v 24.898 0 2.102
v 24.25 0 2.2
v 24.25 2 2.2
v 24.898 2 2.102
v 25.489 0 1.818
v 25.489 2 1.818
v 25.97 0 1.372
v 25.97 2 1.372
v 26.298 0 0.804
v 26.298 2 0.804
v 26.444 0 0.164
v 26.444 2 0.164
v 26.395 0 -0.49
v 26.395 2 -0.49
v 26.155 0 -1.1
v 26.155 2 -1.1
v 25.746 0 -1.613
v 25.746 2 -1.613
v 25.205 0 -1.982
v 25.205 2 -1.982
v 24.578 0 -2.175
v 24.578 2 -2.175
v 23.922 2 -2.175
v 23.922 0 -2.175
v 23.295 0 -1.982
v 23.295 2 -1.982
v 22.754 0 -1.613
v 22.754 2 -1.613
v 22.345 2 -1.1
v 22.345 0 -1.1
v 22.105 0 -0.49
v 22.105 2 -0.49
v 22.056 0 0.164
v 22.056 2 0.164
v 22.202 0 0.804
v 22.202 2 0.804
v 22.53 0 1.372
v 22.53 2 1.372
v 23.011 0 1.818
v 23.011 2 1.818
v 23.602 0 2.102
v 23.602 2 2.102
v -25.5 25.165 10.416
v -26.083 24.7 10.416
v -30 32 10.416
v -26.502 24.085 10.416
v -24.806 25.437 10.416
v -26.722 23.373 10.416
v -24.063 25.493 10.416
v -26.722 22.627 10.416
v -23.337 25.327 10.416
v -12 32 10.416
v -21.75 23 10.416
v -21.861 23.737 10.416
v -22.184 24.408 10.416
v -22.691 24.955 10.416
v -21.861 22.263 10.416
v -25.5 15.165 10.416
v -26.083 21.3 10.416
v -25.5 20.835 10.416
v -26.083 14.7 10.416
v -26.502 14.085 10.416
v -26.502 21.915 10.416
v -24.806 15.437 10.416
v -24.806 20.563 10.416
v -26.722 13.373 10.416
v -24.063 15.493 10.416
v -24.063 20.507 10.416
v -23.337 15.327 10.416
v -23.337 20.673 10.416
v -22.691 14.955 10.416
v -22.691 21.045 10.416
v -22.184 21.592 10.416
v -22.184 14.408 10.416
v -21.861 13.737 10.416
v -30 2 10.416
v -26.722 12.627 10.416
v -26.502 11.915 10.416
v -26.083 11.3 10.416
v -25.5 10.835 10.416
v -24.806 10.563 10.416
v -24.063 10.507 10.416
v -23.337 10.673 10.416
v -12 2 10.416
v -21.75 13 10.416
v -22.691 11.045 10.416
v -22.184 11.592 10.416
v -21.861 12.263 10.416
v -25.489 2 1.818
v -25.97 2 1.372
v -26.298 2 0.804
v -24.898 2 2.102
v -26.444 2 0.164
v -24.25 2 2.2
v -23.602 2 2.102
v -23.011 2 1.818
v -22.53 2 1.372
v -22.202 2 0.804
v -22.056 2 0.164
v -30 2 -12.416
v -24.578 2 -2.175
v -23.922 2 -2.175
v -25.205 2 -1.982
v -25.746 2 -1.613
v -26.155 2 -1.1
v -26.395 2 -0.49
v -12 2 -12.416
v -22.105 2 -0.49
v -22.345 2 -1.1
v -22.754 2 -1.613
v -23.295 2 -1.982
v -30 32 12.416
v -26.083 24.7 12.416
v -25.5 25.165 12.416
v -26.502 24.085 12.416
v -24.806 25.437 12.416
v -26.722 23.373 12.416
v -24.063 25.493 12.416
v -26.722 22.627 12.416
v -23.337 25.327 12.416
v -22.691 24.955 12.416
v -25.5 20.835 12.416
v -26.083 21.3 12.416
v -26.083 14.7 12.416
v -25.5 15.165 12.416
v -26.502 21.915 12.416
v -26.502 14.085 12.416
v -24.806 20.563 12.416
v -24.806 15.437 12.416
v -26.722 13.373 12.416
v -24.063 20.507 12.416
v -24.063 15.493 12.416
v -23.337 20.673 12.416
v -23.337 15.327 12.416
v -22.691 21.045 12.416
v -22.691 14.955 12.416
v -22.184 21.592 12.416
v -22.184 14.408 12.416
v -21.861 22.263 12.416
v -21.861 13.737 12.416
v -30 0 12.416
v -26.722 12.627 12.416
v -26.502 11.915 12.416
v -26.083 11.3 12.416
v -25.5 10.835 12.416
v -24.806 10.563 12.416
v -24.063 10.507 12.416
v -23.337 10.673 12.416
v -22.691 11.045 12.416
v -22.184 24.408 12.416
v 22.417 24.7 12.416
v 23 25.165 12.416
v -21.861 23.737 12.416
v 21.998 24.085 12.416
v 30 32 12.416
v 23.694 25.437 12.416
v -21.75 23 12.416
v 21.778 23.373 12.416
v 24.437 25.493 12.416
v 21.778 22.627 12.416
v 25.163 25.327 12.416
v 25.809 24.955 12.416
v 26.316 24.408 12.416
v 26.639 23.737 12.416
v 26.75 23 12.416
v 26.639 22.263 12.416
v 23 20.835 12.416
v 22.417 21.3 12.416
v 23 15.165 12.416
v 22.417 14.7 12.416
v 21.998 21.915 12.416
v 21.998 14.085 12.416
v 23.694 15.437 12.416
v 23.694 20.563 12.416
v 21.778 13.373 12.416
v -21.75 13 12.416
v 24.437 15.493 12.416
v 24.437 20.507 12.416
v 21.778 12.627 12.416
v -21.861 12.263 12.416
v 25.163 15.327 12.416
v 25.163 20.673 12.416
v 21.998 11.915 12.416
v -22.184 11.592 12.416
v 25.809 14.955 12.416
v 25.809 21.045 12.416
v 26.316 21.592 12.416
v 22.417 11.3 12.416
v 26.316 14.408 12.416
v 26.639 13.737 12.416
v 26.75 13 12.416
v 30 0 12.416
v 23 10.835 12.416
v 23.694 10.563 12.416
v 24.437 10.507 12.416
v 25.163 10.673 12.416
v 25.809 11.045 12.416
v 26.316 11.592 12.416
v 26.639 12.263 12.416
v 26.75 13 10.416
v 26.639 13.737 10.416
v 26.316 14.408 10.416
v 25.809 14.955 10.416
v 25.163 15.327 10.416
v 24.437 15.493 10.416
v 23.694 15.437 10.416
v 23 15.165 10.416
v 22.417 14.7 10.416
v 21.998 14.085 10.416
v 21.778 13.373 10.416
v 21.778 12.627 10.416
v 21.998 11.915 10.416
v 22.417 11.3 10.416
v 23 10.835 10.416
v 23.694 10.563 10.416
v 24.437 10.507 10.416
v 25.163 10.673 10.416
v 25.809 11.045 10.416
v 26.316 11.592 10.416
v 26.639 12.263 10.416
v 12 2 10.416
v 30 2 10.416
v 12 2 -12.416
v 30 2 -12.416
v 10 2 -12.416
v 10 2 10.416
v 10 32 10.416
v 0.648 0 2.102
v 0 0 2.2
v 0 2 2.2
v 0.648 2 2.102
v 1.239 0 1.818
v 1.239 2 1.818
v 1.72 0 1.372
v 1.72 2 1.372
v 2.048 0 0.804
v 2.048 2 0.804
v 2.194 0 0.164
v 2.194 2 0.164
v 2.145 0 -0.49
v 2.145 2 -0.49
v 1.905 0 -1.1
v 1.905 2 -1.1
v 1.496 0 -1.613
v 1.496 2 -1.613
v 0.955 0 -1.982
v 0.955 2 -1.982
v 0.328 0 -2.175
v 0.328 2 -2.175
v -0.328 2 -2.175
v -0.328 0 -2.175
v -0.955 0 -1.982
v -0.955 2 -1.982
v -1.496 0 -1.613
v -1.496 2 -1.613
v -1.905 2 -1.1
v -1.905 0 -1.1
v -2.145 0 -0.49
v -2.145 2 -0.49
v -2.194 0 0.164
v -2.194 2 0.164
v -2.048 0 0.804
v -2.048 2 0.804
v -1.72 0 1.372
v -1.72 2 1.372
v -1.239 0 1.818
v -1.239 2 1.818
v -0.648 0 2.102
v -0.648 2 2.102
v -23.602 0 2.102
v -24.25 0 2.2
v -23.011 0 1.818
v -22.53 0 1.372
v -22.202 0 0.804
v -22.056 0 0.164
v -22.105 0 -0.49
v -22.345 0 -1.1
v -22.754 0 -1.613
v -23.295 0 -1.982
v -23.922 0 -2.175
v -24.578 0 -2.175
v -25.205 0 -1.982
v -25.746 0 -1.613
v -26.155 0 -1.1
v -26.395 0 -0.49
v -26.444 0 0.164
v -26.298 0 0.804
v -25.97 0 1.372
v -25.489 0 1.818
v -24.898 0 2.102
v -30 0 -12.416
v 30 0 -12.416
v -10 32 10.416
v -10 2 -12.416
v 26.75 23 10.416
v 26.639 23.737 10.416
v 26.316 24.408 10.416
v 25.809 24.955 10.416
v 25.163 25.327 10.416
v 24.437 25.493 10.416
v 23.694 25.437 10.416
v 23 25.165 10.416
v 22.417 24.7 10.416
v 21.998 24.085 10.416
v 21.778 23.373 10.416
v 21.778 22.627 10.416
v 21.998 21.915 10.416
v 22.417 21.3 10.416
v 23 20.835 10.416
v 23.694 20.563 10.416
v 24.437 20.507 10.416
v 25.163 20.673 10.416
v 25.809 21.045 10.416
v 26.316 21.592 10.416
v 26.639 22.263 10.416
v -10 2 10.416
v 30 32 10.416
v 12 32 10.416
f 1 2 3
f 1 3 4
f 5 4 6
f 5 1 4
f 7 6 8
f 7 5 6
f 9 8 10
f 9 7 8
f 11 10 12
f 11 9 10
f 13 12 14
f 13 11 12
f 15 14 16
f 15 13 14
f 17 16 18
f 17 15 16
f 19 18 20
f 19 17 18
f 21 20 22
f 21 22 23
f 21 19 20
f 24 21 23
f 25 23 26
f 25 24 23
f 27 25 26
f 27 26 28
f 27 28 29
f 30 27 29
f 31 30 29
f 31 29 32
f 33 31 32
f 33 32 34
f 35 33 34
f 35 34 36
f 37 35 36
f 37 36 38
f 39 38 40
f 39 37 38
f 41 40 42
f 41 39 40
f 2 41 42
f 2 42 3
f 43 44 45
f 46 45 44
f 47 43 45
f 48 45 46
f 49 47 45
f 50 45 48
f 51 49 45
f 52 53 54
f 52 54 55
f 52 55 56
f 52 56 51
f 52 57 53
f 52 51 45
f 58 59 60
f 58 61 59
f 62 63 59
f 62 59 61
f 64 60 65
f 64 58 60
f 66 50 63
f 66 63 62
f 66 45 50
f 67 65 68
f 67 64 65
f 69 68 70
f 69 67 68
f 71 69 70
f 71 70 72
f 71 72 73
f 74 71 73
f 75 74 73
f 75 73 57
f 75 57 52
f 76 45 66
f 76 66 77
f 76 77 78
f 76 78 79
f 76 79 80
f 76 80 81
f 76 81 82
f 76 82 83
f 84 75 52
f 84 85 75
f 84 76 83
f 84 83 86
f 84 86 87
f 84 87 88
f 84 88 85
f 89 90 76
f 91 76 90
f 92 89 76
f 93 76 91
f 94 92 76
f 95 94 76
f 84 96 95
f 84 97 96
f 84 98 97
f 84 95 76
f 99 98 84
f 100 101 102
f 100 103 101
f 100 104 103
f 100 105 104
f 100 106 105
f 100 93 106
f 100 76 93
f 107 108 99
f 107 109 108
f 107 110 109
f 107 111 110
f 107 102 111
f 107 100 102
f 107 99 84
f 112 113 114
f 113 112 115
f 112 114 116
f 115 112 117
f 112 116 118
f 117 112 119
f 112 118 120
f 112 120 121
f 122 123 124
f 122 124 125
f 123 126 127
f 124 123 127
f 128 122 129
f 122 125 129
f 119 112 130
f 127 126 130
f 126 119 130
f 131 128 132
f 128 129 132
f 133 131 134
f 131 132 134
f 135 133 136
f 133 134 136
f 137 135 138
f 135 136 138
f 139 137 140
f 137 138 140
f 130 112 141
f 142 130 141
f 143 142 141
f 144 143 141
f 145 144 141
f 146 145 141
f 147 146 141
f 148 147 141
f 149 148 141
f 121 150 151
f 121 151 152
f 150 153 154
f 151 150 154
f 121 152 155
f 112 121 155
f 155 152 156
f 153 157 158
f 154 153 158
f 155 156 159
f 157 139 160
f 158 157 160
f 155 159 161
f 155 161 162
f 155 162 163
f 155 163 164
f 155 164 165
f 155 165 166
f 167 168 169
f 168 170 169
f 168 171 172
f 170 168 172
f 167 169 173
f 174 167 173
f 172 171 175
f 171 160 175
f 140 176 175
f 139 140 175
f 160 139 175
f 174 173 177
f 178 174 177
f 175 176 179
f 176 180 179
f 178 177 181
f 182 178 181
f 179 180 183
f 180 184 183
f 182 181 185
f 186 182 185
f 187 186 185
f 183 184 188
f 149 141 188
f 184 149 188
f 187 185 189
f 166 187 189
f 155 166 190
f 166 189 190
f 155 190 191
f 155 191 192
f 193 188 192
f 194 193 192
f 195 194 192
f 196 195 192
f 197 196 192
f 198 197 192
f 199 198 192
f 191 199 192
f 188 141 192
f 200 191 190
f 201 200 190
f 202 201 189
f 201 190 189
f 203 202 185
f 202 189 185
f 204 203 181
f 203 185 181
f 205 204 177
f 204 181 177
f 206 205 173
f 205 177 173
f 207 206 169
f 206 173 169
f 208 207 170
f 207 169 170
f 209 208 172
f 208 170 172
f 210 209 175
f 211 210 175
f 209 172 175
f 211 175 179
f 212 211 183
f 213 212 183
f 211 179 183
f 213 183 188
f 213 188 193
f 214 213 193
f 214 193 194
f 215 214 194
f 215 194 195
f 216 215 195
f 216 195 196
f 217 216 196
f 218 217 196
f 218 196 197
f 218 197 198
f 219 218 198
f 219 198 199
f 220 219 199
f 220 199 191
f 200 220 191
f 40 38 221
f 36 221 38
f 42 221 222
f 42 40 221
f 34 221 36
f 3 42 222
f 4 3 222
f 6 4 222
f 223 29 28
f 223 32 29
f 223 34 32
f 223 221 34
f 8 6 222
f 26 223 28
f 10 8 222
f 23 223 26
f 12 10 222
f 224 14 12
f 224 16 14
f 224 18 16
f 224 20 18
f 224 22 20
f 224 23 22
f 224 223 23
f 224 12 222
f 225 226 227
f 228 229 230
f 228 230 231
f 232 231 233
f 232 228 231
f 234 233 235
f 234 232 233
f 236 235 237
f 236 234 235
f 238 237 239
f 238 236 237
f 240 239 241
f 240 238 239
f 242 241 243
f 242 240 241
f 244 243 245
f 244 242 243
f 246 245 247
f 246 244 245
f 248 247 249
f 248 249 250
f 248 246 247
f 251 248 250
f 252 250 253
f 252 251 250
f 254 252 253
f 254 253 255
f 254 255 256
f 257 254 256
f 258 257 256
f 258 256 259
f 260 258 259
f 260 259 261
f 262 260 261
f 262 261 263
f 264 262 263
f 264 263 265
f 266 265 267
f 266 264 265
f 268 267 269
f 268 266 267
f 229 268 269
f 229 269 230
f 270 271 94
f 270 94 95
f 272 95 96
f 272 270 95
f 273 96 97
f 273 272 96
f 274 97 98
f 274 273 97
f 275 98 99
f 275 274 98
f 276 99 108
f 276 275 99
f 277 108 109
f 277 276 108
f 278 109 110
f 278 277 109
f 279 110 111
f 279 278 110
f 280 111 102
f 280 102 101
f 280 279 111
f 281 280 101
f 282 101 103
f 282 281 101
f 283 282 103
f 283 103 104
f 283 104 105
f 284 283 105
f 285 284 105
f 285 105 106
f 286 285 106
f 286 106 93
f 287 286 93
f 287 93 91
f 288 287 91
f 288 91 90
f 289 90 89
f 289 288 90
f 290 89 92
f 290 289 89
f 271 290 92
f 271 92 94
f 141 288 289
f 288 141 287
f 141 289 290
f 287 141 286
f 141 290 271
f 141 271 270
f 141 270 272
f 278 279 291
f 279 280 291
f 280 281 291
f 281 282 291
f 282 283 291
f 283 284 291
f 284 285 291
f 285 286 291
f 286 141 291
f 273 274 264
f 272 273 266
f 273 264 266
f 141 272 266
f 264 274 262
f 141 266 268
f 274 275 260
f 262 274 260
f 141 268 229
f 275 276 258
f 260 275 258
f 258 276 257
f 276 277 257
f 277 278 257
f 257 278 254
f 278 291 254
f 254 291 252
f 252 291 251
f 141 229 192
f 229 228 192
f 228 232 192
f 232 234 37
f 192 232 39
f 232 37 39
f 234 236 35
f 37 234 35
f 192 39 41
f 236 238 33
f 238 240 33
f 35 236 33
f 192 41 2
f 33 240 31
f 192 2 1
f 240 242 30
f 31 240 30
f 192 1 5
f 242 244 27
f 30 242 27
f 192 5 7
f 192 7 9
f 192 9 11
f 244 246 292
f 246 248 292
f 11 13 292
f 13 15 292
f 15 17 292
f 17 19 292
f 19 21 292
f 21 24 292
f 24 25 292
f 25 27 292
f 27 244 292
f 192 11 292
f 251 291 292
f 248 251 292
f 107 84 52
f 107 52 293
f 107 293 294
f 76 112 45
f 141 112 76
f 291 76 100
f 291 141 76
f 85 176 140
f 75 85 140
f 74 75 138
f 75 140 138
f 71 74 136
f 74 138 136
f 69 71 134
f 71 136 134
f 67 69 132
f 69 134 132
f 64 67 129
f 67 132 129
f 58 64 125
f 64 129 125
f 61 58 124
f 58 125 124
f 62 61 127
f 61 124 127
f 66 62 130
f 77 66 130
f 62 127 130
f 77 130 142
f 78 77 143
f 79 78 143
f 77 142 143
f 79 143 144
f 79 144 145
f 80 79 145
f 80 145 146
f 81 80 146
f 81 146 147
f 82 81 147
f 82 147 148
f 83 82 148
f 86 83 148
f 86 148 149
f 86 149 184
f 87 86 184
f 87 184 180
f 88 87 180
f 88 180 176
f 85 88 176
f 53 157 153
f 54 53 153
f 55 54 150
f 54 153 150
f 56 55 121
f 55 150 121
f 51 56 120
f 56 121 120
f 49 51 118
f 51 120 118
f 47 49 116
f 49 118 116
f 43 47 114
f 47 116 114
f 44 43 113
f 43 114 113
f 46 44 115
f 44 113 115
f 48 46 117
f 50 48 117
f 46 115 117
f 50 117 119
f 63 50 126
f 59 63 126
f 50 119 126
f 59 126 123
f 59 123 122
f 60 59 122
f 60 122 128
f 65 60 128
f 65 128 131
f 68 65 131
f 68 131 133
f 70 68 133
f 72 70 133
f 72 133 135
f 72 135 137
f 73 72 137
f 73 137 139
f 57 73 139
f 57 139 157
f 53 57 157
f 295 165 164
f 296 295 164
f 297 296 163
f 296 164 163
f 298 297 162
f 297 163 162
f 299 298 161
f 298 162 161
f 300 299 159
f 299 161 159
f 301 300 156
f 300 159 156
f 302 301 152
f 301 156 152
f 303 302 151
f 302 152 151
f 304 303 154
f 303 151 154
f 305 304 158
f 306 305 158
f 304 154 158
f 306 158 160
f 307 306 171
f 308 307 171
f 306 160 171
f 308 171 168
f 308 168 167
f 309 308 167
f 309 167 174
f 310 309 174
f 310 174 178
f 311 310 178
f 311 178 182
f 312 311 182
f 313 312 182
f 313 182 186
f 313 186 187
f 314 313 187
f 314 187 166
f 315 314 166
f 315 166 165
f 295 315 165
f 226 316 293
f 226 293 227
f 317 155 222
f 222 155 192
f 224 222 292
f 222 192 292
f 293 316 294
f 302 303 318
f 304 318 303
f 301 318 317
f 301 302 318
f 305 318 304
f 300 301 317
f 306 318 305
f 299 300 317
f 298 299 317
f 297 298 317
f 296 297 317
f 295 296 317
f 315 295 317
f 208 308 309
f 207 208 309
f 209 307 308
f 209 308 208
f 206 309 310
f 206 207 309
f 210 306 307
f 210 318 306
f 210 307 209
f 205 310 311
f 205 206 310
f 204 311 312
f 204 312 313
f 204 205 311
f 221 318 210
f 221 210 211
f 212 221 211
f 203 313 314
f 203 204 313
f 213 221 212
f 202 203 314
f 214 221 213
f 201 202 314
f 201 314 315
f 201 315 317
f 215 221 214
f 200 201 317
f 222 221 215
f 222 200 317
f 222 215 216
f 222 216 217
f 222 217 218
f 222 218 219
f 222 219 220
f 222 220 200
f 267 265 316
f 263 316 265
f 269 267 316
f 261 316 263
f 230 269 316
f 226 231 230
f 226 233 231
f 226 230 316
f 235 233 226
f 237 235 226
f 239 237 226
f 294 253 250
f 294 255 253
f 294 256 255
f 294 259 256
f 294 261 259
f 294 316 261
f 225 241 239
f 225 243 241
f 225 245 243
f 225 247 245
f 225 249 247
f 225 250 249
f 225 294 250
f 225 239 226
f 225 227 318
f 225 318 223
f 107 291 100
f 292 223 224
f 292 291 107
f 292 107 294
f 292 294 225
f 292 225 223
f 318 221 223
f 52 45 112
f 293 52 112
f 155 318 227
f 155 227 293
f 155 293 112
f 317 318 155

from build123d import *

# Parameters (mm, degrees)
SKETCH_1_W          = 60
SKETCH_1_H          = 24.832992812
SKETCH_1_R          = 2.2
EXTRUDE_2_DEPTH     = 2
SKETCH_6_W          = 2
SKETCH_6_H          = 22.832992812
SKETCH_6_W_2        = 60
SKETCH_6_H_2        = 2
EXTRUDE_3_DEPTH     = 30
CUT_EXTRUDE_1_DEPTH = 55.241767882
SKETCH_9_R          = 2.5
CUT_EXTRUDE_2_DEPTH = 51.405133984


with BuildPart() as part:
    # 草圖1 → 填料-伸長2 (new body)
    with BuildSketch(Plane(origin=(0, 0, 0), x_dir=(1, 0, 0), z_dir=(0, 1, 0))):
        Rectangle(SKETCH_1_W, SKETCH_1_H)
        with Locations(Location((-24.25, 0, 0), (0, 0, 270))):
            Circle(SKETCH_1_R, mode=Mode.SUBTRACT)
        with Locations(Location((0, 0, 0), (0, 0, 270))):
            Circle(SKETCH_1_R, mode=Mode.SUBTRACT)
        with Locations(Location((24.25, 0, 0), (0, 0, 270))):
            Circle(SKETCH_1_R, mode=Mode.SUBTRACT)
    extrude(amount=EXTRUDE_2_DEPTH)

    # 草圖6 → 填料-伸長3 (add)
    with BuildSketch(Plane(origin=(0, 2, 0), x_dir=(1, 0, 0), z_dir=(0, 1, 0))):
        with Locations((-11, 1)):
            Rectangle(SKETCH_6_W, SKETCH_6_H)
        with Locations((0, -11.416496406)):
            Rectangle(SKETCH_6_W_2, SKETCH_6_H_2)
        with Locations((11, 1)):
            Rectangle(SKETCH_6_W, SKETCH_6_H)
    extrude(amount=EXTRUDE_3_DEPTH)

    # 草圖8 → 除料-伸長1 (cut, through all)
    with BuildSketch(Plane.ZY.offset(12)):
        Polygon((10.416496406, 32), (-12.416496406, 2), (-12.416496406, 32), align=None)
    extrude(amount=-CUT_EXTRUDE_1_DEPTH, mode=Mode.SUBTRACT)

    # 草圖9 → 除料-伸長2 (cut, through all)
    with BuildSketch(Plane.XY.offset(12.416496406)):
        with Locations((-24.25, 13)):
            Circle(SKETCH_9_R)
        with Locations((24.25, 13)):
            Circle(SKETCH_9_R)
        with Locations((24.25, 23)):
            Circle(SKETCH_9_R)
        with Locations((-24.25, 23)):
            Circle(SKETCH_9_R)
    extrude(amount=-CUT_EXTRUDE_2_DEPTH, mode=Mode.SUBTRACT)


solid = part.part
